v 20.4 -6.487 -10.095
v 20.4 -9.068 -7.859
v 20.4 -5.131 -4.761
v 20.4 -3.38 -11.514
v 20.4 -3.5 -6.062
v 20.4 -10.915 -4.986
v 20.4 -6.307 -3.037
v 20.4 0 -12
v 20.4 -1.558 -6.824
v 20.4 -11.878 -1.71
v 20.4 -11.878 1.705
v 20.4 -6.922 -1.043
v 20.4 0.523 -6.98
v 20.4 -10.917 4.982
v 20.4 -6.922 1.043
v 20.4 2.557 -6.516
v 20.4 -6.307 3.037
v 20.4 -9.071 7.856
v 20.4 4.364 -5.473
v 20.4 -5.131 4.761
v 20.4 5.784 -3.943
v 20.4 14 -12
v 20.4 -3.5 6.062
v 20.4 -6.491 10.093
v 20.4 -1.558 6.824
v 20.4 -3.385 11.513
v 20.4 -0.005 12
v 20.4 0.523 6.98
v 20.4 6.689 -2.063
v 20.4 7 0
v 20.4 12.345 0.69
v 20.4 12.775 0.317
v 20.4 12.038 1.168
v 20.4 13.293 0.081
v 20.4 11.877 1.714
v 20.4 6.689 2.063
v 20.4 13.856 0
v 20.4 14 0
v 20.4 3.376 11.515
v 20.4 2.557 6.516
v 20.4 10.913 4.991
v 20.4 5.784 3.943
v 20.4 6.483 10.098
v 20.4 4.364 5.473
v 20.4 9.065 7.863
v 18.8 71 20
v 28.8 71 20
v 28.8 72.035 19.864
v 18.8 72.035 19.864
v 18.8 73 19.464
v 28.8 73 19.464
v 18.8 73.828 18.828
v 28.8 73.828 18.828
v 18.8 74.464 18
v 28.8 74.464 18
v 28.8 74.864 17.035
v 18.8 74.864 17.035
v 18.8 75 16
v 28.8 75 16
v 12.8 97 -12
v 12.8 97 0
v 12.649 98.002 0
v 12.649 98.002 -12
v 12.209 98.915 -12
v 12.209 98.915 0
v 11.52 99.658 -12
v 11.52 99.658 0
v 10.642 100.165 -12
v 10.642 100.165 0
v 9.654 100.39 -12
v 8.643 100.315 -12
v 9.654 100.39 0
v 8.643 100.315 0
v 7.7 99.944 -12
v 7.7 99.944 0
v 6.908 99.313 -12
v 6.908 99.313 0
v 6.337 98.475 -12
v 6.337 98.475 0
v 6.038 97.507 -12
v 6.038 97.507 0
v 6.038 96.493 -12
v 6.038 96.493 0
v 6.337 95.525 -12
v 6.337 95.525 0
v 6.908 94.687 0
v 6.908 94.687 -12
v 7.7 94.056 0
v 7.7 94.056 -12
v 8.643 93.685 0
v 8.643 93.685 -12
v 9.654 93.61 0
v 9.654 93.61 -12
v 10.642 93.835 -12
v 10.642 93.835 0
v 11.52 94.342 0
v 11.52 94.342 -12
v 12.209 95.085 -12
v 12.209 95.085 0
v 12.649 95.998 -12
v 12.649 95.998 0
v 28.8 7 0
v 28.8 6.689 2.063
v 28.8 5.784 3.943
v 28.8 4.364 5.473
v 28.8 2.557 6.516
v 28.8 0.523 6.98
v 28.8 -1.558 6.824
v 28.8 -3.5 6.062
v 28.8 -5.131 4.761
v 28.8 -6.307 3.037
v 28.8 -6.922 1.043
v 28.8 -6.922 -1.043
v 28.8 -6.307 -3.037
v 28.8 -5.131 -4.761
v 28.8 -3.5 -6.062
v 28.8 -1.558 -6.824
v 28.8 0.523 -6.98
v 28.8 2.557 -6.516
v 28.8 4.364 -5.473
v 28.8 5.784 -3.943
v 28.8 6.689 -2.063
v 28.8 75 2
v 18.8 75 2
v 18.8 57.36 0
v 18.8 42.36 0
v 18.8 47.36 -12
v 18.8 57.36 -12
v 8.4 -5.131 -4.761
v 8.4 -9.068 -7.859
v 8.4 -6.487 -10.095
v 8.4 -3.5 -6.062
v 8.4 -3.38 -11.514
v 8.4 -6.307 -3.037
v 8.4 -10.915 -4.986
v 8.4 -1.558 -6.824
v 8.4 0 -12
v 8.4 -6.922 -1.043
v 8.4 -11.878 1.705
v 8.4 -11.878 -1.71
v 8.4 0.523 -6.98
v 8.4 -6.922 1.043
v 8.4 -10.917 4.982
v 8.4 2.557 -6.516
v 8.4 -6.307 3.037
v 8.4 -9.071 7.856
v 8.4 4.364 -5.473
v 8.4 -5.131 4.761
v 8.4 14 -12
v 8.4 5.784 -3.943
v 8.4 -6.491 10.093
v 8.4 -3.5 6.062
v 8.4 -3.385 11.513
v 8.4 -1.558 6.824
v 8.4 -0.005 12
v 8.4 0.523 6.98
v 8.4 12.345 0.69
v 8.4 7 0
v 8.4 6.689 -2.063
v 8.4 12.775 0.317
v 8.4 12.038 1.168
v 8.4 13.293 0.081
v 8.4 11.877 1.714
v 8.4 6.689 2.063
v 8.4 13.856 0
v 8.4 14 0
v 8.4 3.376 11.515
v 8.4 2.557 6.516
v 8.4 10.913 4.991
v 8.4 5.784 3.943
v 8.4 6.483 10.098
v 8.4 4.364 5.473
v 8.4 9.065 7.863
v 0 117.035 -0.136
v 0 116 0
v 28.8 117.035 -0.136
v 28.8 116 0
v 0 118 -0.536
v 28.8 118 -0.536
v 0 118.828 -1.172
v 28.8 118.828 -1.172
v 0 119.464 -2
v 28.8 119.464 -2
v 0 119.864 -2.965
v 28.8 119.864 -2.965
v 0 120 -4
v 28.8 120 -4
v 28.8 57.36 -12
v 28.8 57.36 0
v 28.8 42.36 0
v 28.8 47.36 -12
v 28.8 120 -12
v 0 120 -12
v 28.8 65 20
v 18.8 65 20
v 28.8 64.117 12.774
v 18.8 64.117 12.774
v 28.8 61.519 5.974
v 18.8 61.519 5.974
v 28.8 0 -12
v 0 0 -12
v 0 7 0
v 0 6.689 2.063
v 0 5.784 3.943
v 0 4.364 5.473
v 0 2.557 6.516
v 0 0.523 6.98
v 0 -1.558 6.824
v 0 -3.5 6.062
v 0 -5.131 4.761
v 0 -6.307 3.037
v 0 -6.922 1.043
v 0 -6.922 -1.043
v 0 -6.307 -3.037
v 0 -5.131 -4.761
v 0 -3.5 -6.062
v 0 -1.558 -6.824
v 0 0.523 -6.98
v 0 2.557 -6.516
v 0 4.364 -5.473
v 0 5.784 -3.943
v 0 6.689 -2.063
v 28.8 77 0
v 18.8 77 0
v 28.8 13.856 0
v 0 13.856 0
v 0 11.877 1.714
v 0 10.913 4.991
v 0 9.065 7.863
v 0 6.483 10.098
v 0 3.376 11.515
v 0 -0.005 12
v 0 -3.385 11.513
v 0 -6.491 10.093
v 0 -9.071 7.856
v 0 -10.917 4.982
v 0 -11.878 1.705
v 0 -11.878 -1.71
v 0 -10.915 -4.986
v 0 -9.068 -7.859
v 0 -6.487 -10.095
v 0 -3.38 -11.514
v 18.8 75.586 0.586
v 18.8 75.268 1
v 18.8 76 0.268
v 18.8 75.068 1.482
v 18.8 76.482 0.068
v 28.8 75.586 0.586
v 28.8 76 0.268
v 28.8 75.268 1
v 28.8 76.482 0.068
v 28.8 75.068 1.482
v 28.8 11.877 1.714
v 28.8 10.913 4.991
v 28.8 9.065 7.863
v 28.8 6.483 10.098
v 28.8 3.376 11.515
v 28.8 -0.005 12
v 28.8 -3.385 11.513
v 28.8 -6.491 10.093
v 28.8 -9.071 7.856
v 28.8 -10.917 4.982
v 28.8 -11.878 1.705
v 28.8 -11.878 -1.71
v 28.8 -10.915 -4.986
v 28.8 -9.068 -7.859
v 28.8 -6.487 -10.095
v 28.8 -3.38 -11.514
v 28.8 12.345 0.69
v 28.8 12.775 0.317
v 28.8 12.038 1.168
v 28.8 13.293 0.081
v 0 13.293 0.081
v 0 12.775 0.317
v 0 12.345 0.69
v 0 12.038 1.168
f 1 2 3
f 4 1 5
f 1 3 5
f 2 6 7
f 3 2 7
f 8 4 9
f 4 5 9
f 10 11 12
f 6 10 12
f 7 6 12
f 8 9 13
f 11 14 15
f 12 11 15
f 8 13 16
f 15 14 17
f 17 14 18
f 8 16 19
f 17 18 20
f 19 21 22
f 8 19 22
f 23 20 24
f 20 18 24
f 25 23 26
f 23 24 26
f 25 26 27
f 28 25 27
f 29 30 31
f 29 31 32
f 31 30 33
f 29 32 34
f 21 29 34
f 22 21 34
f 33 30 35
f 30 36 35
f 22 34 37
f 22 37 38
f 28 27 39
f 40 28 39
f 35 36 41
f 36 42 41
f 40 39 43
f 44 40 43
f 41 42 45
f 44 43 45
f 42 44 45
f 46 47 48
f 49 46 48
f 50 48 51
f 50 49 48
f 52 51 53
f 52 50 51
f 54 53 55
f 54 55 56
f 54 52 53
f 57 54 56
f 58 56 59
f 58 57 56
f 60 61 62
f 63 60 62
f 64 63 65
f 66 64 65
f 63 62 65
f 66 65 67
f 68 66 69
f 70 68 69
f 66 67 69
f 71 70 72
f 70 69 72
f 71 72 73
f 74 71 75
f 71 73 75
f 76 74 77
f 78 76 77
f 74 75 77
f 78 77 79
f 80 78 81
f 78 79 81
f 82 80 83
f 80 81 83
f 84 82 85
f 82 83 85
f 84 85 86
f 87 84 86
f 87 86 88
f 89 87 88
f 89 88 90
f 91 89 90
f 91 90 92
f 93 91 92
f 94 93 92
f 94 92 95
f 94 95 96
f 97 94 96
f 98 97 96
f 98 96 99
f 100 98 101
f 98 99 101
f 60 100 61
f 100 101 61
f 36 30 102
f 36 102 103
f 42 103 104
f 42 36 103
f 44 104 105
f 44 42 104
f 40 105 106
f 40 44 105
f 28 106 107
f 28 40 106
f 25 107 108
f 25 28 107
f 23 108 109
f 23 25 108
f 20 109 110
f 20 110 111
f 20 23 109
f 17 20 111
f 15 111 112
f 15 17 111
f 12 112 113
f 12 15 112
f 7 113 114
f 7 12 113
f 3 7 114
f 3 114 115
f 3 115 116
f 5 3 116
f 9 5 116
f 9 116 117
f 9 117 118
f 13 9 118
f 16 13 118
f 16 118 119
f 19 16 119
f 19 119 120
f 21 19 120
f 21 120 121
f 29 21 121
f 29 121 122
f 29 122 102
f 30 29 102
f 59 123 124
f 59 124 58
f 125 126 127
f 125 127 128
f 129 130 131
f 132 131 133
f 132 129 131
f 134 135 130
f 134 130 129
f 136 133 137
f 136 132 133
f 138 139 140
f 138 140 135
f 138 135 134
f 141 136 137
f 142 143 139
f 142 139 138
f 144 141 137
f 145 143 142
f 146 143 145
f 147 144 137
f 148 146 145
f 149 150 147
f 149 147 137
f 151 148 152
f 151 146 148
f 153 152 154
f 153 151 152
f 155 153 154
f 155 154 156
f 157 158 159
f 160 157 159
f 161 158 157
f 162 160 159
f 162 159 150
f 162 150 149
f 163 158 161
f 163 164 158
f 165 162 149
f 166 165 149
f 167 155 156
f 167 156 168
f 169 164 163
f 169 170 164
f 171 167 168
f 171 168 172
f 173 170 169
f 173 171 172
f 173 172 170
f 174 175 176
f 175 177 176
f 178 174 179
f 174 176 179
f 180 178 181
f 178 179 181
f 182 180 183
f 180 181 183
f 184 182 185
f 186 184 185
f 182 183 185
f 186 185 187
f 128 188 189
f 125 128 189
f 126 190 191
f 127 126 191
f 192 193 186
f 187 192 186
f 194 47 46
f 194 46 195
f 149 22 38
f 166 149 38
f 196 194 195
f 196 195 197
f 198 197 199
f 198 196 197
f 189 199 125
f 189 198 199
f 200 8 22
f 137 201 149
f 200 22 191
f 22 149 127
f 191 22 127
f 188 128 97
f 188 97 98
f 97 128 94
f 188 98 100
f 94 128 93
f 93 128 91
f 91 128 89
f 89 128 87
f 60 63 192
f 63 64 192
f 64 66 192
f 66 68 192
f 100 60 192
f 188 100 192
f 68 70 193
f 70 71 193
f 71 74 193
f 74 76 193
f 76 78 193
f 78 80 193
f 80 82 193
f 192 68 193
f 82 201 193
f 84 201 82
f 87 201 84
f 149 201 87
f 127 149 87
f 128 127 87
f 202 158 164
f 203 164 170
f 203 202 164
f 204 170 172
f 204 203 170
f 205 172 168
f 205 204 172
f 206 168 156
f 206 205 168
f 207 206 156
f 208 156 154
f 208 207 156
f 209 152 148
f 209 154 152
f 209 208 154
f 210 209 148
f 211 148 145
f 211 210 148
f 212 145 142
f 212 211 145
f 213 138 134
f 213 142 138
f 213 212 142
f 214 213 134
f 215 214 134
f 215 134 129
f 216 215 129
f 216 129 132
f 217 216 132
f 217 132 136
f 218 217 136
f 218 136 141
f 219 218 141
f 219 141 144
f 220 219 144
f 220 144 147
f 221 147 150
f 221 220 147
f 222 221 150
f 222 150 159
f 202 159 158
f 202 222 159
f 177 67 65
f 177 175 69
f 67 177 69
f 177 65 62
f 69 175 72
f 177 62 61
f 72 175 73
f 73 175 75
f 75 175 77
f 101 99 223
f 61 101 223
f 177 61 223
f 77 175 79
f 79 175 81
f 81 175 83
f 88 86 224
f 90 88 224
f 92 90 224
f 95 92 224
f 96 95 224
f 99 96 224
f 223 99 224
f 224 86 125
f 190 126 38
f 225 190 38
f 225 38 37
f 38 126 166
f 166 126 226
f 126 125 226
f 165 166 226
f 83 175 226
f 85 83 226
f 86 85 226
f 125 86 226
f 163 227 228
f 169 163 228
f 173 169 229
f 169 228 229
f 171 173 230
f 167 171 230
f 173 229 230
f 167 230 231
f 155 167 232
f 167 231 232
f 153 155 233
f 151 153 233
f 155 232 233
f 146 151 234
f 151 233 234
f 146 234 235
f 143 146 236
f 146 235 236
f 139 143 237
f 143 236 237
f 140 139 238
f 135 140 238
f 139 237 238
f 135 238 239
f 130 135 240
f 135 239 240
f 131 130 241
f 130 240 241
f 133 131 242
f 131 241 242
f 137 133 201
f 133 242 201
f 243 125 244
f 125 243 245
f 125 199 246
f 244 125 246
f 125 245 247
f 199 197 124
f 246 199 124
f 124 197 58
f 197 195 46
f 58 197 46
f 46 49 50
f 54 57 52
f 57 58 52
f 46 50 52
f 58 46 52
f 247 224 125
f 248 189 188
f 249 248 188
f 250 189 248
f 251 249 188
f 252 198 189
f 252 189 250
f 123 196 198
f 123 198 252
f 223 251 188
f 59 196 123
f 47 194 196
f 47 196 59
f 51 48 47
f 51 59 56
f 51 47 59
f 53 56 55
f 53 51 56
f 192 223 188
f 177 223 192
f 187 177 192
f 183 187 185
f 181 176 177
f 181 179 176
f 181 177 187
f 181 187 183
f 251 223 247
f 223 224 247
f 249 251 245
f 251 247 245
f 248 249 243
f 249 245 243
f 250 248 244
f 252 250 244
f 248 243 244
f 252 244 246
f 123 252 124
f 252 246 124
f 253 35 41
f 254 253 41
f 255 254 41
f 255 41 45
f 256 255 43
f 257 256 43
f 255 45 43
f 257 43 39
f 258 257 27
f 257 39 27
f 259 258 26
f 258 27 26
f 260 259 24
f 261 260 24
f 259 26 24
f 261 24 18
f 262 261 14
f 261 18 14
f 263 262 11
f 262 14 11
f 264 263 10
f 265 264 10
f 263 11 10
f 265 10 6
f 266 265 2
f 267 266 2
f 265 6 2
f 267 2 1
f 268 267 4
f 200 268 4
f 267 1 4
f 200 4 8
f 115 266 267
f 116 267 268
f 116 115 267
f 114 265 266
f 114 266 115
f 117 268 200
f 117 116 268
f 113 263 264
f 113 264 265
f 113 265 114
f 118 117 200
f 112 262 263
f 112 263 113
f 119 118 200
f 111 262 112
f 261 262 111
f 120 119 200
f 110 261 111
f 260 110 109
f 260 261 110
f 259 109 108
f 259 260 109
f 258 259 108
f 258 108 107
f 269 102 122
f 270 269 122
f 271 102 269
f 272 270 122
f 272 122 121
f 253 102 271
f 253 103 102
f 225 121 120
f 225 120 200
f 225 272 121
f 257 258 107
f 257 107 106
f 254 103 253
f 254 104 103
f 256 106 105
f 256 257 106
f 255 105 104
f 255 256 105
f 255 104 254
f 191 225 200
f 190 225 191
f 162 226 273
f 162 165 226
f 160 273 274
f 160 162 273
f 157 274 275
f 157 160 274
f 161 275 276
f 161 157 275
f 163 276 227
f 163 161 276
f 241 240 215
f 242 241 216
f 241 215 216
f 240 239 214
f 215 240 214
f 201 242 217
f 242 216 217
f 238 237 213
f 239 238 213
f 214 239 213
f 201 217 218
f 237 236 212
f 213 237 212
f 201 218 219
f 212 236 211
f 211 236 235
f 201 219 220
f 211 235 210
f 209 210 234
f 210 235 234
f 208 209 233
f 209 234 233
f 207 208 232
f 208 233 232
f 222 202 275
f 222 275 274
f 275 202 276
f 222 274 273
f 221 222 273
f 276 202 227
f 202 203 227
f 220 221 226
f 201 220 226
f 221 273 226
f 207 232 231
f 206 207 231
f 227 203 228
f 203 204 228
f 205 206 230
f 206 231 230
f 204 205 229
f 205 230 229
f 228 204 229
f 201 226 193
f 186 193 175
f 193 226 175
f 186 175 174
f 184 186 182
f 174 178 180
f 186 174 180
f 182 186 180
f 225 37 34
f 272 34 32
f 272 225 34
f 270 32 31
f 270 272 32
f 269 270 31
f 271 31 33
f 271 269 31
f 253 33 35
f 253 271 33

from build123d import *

# Parameters (mm, degrees)
F0_R      = 7
F1_DEPTH  = 28.8
F4_DEPTH  = 12
F6_DEPTH  = 10
F8_DEPTH  = 10
F9_R      = 3.4
F10_DEPTH = 12
F11_R     = 2
F12_R     = 4


with BuildPart() as f1:
    # F0 (on Right) → F1 (new body)
    with BuildSketch(Plane.YZ):
        with BuildLine():
            Line((120, 0), (12, 0))
            ThreePointArc((12, 0), (-8.4852813742, 8.4852813742), (0, -12))
            Line((0, -12), (120, -12))
            Line((120, -12), (120, 0))
        make_face()
        Circle(F0_R, mode=Mode.SUBTRACT)
    extrude(amount=F1_DEPTH)

    # F3 (on offset) → F4 (cut)
    with BuildSketch(Plane.YZ.offset(20.4)):
        with BuildLine():
            Line((14, -12), (14, 0))
            Line((14, 0), (12, 0))
            ThreePointArc((12, 0), (-8.4852813742, 8.4852813742), (0, -12))
            Line((0, -12), (14, -12))
        make_face()
    extrude(amount=-F4_DEPTH, mode=Mode.SUBTRACT)

    # F5 (on face) → F6 (join)
    with BuildSketch(Plane.YZ.offset(28.8)):
        with BuildLine():
            Line((65, 0), (75, 0))
            Line((75, 0), (75, 20))
            Line((75, 20), (65, 20))
            ThreePointArc((65, 20), (63.0248532563, 9.2952660561), (57.36, 0))
            Line((57.36, 0), (65, 0))
        make_face()
    extrude(amount=-F6_DEPTH)

    # F7 (on face) → F8 (cut, through all)
    with BuildSketch(Plane.YZ.offset(28.8)):
        Polygon((57.36, -12), (57.36, 0), (42.36, 0), (47.36, -12), align=None)
    extrude(amount=-F8_DEPTH, mode=Mode.SUBTRACT)

    # F9 (on Top) → F10 (cut, through all)
    with BuildSketch(Plane.XY):
        with Locations((9.4, 97)):
            Circle(F9_R)
    extrude(amount=-F10_DEPTH, mode=Mode.SUBTRACT)

    # F11
    f11_edges = [f1.edges().sort_by_distance(p)[0] for p in [
        (23.8, 75, 0),
        (24.6, 12, 0),
        (4.2, 12, 0),
    ]]
    fillet(f11_edges, radius=F11_R)

    # F12
    f12_edges = [f1.edges().sort_by_distance(p)[0] for p in [
        (23.8, 75, 20),
        (14.4, 120, 0),
    ]]
    fillet(f12_edges, radius=F12_R)


solid = f1.part
